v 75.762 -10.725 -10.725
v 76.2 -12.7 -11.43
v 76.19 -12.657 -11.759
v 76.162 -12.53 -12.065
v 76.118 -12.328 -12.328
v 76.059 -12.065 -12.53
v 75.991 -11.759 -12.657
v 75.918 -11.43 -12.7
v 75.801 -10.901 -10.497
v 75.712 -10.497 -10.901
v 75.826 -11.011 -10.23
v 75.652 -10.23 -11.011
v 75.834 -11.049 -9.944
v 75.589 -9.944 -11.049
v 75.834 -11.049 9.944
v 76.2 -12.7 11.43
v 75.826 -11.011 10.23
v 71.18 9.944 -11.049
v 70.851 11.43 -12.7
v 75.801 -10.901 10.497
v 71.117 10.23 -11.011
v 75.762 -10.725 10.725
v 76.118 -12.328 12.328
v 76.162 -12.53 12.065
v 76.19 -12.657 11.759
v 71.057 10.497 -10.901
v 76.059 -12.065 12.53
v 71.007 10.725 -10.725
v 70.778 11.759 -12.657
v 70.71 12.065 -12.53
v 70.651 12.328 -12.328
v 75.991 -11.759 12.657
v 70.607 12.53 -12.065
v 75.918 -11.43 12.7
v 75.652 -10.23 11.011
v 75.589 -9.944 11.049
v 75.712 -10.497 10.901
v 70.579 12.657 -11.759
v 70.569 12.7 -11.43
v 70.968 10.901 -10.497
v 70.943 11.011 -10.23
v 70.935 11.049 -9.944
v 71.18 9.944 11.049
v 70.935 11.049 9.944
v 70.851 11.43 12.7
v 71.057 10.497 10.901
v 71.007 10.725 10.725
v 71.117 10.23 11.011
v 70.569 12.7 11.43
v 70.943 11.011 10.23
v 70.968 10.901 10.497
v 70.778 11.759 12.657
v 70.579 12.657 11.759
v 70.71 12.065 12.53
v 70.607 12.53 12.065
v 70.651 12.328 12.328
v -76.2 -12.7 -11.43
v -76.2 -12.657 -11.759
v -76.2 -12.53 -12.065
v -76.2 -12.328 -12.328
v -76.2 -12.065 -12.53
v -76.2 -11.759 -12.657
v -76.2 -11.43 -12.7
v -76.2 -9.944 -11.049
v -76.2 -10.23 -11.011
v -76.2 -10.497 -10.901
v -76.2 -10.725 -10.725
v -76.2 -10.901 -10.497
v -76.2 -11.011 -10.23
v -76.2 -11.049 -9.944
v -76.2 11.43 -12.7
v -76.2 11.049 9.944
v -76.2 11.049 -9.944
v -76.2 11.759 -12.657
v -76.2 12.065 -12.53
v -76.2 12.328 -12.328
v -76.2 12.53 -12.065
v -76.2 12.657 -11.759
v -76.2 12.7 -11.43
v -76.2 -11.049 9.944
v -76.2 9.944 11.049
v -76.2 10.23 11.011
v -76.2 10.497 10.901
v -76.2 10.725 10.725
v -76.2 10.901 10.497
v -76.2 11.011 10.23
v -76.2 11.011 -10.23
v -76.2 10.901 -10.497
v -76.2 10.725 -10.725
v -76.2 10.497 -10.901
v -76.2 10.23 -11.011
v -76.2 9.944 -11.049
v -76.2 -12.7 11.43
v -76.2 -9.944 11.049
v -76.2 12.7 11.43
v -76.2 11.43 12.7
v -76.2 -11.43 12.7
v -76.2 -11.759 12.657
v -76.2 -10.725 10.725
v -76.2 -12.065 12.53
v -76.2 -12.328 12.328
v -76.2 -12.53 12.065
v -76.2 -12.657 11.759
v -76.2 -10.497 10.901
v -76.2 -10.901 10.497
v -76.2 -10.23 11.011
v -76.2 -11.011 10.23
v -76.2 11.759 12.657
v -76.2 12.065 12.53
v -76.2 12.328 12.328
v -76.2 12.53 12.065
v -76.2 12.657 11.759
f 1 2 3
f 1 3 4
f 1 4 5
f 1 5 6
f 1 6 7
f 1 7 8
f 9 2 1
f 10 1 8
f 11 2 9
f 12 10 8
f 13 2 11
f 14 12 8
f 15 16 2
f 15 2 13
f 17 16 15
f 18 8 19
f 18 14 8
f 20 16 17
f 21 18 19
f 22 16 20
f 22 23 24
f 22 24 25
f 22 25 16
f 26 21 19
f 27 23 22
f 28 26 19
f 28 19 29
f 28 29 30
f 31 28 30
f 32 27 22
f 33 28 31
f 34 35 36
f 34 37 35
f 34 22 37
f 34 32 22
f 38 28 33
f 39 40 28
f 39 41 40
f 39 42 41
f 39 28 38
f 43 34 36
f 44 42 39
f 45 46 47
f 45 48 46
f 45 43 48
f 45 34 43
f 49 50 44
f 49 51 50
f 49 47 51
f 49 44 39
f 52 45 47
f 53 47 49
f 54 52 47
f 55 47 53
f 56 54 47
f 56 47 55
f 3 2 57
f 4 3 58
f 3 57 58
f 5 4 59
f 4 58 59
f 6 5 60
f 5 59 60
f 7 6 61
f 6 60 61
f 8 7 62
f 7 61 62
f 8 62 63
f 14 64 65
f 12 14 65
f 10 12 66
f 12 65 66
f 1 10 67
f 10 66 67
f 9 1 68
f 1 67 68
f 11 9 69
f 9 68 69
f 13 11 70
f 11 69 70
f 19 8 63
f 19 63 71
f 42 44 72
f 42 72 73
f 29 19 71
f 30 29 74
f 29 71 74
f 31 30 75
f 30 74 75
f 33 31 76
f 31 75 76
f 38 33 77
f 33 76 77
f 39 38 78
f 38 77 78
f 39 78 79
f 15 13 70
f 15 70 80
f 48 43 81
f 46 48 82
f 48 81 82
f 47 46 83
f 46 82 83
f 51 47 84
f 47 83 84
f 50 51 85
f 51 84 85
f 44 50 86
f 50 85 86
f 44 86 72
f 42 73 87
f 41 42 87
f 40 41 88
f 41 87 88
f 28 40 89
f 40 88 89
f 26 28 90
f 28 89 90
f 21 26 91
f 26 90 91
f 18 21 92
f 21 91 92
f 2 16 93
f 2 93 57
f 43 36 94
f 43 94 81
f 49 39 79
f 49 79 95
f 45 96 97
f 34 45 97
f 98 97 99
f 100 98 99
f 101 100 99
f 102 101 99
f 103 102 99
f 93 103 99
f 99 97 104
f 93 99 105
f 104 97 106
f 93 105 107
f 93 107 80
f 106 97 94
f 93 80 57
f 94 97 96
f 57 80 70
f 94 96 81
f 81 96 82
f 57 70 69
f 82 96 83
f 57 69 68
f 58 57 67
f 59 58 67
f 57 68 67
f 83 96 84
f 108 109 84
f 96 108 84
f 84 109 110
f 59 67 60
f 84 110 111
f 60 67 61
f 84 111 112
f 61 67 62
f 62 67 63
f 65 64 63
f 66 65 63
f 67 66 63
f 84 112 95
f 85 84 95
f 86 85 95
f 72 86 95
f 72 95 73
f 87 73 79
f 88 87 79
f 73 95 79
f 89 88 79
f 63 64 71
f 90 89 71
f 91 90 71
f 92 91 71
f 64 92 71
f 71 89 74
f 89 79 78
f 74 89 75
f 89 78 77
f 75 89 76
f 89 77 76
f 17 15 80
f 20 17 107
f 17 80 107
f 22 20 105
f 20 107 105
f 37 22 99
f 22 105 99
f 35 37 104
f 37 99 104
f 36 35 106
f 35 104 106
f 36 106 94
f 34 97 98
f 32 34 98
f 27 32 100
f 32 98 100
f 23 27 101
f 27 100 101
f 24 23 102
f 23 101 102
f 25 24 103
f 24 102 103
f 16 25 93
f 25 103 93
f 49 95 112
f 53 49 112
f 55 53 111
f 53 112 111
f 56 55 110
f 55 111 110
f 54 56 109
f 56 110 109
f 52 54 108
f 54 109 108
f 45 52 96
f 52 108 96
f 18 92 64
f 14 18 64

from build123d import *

# Parameters (mm, degrees)
BOSS_EXTRUDE1_DEPTH      = 76.2
BOSS_EXTRUDE1_DEPTH_BACK = 76.2
CUT_EXTRUDE1_DEPTH       = 82.319677815


with BuildPart() as part:
    # Sketch4 → Boss-Extrude1 (new, two sides: drawn at the far end of the back side and taken through both)
    with BuildSketch(Plane(origin=(0, 0, 0), x_dir=(0, 0, -1), z_dir=(1, 0, 0)).offset(-BOSS_EXTRUDE1_DEPTH_BACK)):
        with BuildLine():
            Line((12.7, -11.43), (12.7, 11.43))
            ThreePointArc((12.7, 11.43), (12.328025612, 12.328025612), (11.43, 12.7))
            Line((11.43, 12.7), (-11.43, 12.7))
            ThreePointArc((-11.43, 12.7), (-12.328025612, 12.328025612), (-12.7, 11.43))
            Line((-12.7, 11.43), (-12.7, -11.43))
            ThreePointArc((-12.7, -11.43), (-12.328025612, -12.328025612), (-11.43, -12.7))
            Line((-11.43, -12.7), (11.43, -12.7))
            ThreePointArc((11.43, -12.7), (12.328025612, -12.328025612), (12.7, -11.43))
        make_face()
        with BuildLine():
            Line((11.049, 9.9441), (11.049, -9.9441))
            ThreePointArc((11.049, -9.9441), (10.725382283, -10.725382283), (9.9441, -11.049))
            Line((9.9441, -11.049), (-9.9441, -11.049))
            ThreePointArc((-9.9441, -11.049), (-10.725382283, -10.725382283), (-11.049, -9.9441))
            Line((-11.049, -9.9441), (-11.049, 9.9441))
            ThreePointArc((-11.049, 9.9441), (-10.725382283, 10.725382283), (-9.9441, 11.049))
            Line((-9.9441, 11.049), (9.9441, 11.049))
            ThreePointArc((9.9441, 11.049), (10.725382283, 10.725382283), (11.049, 9.9441))
        make_face(mode=Mode.SUBTRACT)
    extrude(amount=BOSS_EXTRUDE1_DEPTH + BOSS_EXTRUDE1_DEPTH_BACK)

    # Sketch5 → Cut-Extrude1 (cut, through all)
    with BuildSketch(Plane.XY.offset(12.7)):
        Polygon((76.2, -12.7), (70.568955569, 12.7), (76.2, 12.7), align=None)
    extrude(amount=-CUT_EXTRUDE1_DEPTH, mode=Mode.SUBTRACT)


solid = part.part
